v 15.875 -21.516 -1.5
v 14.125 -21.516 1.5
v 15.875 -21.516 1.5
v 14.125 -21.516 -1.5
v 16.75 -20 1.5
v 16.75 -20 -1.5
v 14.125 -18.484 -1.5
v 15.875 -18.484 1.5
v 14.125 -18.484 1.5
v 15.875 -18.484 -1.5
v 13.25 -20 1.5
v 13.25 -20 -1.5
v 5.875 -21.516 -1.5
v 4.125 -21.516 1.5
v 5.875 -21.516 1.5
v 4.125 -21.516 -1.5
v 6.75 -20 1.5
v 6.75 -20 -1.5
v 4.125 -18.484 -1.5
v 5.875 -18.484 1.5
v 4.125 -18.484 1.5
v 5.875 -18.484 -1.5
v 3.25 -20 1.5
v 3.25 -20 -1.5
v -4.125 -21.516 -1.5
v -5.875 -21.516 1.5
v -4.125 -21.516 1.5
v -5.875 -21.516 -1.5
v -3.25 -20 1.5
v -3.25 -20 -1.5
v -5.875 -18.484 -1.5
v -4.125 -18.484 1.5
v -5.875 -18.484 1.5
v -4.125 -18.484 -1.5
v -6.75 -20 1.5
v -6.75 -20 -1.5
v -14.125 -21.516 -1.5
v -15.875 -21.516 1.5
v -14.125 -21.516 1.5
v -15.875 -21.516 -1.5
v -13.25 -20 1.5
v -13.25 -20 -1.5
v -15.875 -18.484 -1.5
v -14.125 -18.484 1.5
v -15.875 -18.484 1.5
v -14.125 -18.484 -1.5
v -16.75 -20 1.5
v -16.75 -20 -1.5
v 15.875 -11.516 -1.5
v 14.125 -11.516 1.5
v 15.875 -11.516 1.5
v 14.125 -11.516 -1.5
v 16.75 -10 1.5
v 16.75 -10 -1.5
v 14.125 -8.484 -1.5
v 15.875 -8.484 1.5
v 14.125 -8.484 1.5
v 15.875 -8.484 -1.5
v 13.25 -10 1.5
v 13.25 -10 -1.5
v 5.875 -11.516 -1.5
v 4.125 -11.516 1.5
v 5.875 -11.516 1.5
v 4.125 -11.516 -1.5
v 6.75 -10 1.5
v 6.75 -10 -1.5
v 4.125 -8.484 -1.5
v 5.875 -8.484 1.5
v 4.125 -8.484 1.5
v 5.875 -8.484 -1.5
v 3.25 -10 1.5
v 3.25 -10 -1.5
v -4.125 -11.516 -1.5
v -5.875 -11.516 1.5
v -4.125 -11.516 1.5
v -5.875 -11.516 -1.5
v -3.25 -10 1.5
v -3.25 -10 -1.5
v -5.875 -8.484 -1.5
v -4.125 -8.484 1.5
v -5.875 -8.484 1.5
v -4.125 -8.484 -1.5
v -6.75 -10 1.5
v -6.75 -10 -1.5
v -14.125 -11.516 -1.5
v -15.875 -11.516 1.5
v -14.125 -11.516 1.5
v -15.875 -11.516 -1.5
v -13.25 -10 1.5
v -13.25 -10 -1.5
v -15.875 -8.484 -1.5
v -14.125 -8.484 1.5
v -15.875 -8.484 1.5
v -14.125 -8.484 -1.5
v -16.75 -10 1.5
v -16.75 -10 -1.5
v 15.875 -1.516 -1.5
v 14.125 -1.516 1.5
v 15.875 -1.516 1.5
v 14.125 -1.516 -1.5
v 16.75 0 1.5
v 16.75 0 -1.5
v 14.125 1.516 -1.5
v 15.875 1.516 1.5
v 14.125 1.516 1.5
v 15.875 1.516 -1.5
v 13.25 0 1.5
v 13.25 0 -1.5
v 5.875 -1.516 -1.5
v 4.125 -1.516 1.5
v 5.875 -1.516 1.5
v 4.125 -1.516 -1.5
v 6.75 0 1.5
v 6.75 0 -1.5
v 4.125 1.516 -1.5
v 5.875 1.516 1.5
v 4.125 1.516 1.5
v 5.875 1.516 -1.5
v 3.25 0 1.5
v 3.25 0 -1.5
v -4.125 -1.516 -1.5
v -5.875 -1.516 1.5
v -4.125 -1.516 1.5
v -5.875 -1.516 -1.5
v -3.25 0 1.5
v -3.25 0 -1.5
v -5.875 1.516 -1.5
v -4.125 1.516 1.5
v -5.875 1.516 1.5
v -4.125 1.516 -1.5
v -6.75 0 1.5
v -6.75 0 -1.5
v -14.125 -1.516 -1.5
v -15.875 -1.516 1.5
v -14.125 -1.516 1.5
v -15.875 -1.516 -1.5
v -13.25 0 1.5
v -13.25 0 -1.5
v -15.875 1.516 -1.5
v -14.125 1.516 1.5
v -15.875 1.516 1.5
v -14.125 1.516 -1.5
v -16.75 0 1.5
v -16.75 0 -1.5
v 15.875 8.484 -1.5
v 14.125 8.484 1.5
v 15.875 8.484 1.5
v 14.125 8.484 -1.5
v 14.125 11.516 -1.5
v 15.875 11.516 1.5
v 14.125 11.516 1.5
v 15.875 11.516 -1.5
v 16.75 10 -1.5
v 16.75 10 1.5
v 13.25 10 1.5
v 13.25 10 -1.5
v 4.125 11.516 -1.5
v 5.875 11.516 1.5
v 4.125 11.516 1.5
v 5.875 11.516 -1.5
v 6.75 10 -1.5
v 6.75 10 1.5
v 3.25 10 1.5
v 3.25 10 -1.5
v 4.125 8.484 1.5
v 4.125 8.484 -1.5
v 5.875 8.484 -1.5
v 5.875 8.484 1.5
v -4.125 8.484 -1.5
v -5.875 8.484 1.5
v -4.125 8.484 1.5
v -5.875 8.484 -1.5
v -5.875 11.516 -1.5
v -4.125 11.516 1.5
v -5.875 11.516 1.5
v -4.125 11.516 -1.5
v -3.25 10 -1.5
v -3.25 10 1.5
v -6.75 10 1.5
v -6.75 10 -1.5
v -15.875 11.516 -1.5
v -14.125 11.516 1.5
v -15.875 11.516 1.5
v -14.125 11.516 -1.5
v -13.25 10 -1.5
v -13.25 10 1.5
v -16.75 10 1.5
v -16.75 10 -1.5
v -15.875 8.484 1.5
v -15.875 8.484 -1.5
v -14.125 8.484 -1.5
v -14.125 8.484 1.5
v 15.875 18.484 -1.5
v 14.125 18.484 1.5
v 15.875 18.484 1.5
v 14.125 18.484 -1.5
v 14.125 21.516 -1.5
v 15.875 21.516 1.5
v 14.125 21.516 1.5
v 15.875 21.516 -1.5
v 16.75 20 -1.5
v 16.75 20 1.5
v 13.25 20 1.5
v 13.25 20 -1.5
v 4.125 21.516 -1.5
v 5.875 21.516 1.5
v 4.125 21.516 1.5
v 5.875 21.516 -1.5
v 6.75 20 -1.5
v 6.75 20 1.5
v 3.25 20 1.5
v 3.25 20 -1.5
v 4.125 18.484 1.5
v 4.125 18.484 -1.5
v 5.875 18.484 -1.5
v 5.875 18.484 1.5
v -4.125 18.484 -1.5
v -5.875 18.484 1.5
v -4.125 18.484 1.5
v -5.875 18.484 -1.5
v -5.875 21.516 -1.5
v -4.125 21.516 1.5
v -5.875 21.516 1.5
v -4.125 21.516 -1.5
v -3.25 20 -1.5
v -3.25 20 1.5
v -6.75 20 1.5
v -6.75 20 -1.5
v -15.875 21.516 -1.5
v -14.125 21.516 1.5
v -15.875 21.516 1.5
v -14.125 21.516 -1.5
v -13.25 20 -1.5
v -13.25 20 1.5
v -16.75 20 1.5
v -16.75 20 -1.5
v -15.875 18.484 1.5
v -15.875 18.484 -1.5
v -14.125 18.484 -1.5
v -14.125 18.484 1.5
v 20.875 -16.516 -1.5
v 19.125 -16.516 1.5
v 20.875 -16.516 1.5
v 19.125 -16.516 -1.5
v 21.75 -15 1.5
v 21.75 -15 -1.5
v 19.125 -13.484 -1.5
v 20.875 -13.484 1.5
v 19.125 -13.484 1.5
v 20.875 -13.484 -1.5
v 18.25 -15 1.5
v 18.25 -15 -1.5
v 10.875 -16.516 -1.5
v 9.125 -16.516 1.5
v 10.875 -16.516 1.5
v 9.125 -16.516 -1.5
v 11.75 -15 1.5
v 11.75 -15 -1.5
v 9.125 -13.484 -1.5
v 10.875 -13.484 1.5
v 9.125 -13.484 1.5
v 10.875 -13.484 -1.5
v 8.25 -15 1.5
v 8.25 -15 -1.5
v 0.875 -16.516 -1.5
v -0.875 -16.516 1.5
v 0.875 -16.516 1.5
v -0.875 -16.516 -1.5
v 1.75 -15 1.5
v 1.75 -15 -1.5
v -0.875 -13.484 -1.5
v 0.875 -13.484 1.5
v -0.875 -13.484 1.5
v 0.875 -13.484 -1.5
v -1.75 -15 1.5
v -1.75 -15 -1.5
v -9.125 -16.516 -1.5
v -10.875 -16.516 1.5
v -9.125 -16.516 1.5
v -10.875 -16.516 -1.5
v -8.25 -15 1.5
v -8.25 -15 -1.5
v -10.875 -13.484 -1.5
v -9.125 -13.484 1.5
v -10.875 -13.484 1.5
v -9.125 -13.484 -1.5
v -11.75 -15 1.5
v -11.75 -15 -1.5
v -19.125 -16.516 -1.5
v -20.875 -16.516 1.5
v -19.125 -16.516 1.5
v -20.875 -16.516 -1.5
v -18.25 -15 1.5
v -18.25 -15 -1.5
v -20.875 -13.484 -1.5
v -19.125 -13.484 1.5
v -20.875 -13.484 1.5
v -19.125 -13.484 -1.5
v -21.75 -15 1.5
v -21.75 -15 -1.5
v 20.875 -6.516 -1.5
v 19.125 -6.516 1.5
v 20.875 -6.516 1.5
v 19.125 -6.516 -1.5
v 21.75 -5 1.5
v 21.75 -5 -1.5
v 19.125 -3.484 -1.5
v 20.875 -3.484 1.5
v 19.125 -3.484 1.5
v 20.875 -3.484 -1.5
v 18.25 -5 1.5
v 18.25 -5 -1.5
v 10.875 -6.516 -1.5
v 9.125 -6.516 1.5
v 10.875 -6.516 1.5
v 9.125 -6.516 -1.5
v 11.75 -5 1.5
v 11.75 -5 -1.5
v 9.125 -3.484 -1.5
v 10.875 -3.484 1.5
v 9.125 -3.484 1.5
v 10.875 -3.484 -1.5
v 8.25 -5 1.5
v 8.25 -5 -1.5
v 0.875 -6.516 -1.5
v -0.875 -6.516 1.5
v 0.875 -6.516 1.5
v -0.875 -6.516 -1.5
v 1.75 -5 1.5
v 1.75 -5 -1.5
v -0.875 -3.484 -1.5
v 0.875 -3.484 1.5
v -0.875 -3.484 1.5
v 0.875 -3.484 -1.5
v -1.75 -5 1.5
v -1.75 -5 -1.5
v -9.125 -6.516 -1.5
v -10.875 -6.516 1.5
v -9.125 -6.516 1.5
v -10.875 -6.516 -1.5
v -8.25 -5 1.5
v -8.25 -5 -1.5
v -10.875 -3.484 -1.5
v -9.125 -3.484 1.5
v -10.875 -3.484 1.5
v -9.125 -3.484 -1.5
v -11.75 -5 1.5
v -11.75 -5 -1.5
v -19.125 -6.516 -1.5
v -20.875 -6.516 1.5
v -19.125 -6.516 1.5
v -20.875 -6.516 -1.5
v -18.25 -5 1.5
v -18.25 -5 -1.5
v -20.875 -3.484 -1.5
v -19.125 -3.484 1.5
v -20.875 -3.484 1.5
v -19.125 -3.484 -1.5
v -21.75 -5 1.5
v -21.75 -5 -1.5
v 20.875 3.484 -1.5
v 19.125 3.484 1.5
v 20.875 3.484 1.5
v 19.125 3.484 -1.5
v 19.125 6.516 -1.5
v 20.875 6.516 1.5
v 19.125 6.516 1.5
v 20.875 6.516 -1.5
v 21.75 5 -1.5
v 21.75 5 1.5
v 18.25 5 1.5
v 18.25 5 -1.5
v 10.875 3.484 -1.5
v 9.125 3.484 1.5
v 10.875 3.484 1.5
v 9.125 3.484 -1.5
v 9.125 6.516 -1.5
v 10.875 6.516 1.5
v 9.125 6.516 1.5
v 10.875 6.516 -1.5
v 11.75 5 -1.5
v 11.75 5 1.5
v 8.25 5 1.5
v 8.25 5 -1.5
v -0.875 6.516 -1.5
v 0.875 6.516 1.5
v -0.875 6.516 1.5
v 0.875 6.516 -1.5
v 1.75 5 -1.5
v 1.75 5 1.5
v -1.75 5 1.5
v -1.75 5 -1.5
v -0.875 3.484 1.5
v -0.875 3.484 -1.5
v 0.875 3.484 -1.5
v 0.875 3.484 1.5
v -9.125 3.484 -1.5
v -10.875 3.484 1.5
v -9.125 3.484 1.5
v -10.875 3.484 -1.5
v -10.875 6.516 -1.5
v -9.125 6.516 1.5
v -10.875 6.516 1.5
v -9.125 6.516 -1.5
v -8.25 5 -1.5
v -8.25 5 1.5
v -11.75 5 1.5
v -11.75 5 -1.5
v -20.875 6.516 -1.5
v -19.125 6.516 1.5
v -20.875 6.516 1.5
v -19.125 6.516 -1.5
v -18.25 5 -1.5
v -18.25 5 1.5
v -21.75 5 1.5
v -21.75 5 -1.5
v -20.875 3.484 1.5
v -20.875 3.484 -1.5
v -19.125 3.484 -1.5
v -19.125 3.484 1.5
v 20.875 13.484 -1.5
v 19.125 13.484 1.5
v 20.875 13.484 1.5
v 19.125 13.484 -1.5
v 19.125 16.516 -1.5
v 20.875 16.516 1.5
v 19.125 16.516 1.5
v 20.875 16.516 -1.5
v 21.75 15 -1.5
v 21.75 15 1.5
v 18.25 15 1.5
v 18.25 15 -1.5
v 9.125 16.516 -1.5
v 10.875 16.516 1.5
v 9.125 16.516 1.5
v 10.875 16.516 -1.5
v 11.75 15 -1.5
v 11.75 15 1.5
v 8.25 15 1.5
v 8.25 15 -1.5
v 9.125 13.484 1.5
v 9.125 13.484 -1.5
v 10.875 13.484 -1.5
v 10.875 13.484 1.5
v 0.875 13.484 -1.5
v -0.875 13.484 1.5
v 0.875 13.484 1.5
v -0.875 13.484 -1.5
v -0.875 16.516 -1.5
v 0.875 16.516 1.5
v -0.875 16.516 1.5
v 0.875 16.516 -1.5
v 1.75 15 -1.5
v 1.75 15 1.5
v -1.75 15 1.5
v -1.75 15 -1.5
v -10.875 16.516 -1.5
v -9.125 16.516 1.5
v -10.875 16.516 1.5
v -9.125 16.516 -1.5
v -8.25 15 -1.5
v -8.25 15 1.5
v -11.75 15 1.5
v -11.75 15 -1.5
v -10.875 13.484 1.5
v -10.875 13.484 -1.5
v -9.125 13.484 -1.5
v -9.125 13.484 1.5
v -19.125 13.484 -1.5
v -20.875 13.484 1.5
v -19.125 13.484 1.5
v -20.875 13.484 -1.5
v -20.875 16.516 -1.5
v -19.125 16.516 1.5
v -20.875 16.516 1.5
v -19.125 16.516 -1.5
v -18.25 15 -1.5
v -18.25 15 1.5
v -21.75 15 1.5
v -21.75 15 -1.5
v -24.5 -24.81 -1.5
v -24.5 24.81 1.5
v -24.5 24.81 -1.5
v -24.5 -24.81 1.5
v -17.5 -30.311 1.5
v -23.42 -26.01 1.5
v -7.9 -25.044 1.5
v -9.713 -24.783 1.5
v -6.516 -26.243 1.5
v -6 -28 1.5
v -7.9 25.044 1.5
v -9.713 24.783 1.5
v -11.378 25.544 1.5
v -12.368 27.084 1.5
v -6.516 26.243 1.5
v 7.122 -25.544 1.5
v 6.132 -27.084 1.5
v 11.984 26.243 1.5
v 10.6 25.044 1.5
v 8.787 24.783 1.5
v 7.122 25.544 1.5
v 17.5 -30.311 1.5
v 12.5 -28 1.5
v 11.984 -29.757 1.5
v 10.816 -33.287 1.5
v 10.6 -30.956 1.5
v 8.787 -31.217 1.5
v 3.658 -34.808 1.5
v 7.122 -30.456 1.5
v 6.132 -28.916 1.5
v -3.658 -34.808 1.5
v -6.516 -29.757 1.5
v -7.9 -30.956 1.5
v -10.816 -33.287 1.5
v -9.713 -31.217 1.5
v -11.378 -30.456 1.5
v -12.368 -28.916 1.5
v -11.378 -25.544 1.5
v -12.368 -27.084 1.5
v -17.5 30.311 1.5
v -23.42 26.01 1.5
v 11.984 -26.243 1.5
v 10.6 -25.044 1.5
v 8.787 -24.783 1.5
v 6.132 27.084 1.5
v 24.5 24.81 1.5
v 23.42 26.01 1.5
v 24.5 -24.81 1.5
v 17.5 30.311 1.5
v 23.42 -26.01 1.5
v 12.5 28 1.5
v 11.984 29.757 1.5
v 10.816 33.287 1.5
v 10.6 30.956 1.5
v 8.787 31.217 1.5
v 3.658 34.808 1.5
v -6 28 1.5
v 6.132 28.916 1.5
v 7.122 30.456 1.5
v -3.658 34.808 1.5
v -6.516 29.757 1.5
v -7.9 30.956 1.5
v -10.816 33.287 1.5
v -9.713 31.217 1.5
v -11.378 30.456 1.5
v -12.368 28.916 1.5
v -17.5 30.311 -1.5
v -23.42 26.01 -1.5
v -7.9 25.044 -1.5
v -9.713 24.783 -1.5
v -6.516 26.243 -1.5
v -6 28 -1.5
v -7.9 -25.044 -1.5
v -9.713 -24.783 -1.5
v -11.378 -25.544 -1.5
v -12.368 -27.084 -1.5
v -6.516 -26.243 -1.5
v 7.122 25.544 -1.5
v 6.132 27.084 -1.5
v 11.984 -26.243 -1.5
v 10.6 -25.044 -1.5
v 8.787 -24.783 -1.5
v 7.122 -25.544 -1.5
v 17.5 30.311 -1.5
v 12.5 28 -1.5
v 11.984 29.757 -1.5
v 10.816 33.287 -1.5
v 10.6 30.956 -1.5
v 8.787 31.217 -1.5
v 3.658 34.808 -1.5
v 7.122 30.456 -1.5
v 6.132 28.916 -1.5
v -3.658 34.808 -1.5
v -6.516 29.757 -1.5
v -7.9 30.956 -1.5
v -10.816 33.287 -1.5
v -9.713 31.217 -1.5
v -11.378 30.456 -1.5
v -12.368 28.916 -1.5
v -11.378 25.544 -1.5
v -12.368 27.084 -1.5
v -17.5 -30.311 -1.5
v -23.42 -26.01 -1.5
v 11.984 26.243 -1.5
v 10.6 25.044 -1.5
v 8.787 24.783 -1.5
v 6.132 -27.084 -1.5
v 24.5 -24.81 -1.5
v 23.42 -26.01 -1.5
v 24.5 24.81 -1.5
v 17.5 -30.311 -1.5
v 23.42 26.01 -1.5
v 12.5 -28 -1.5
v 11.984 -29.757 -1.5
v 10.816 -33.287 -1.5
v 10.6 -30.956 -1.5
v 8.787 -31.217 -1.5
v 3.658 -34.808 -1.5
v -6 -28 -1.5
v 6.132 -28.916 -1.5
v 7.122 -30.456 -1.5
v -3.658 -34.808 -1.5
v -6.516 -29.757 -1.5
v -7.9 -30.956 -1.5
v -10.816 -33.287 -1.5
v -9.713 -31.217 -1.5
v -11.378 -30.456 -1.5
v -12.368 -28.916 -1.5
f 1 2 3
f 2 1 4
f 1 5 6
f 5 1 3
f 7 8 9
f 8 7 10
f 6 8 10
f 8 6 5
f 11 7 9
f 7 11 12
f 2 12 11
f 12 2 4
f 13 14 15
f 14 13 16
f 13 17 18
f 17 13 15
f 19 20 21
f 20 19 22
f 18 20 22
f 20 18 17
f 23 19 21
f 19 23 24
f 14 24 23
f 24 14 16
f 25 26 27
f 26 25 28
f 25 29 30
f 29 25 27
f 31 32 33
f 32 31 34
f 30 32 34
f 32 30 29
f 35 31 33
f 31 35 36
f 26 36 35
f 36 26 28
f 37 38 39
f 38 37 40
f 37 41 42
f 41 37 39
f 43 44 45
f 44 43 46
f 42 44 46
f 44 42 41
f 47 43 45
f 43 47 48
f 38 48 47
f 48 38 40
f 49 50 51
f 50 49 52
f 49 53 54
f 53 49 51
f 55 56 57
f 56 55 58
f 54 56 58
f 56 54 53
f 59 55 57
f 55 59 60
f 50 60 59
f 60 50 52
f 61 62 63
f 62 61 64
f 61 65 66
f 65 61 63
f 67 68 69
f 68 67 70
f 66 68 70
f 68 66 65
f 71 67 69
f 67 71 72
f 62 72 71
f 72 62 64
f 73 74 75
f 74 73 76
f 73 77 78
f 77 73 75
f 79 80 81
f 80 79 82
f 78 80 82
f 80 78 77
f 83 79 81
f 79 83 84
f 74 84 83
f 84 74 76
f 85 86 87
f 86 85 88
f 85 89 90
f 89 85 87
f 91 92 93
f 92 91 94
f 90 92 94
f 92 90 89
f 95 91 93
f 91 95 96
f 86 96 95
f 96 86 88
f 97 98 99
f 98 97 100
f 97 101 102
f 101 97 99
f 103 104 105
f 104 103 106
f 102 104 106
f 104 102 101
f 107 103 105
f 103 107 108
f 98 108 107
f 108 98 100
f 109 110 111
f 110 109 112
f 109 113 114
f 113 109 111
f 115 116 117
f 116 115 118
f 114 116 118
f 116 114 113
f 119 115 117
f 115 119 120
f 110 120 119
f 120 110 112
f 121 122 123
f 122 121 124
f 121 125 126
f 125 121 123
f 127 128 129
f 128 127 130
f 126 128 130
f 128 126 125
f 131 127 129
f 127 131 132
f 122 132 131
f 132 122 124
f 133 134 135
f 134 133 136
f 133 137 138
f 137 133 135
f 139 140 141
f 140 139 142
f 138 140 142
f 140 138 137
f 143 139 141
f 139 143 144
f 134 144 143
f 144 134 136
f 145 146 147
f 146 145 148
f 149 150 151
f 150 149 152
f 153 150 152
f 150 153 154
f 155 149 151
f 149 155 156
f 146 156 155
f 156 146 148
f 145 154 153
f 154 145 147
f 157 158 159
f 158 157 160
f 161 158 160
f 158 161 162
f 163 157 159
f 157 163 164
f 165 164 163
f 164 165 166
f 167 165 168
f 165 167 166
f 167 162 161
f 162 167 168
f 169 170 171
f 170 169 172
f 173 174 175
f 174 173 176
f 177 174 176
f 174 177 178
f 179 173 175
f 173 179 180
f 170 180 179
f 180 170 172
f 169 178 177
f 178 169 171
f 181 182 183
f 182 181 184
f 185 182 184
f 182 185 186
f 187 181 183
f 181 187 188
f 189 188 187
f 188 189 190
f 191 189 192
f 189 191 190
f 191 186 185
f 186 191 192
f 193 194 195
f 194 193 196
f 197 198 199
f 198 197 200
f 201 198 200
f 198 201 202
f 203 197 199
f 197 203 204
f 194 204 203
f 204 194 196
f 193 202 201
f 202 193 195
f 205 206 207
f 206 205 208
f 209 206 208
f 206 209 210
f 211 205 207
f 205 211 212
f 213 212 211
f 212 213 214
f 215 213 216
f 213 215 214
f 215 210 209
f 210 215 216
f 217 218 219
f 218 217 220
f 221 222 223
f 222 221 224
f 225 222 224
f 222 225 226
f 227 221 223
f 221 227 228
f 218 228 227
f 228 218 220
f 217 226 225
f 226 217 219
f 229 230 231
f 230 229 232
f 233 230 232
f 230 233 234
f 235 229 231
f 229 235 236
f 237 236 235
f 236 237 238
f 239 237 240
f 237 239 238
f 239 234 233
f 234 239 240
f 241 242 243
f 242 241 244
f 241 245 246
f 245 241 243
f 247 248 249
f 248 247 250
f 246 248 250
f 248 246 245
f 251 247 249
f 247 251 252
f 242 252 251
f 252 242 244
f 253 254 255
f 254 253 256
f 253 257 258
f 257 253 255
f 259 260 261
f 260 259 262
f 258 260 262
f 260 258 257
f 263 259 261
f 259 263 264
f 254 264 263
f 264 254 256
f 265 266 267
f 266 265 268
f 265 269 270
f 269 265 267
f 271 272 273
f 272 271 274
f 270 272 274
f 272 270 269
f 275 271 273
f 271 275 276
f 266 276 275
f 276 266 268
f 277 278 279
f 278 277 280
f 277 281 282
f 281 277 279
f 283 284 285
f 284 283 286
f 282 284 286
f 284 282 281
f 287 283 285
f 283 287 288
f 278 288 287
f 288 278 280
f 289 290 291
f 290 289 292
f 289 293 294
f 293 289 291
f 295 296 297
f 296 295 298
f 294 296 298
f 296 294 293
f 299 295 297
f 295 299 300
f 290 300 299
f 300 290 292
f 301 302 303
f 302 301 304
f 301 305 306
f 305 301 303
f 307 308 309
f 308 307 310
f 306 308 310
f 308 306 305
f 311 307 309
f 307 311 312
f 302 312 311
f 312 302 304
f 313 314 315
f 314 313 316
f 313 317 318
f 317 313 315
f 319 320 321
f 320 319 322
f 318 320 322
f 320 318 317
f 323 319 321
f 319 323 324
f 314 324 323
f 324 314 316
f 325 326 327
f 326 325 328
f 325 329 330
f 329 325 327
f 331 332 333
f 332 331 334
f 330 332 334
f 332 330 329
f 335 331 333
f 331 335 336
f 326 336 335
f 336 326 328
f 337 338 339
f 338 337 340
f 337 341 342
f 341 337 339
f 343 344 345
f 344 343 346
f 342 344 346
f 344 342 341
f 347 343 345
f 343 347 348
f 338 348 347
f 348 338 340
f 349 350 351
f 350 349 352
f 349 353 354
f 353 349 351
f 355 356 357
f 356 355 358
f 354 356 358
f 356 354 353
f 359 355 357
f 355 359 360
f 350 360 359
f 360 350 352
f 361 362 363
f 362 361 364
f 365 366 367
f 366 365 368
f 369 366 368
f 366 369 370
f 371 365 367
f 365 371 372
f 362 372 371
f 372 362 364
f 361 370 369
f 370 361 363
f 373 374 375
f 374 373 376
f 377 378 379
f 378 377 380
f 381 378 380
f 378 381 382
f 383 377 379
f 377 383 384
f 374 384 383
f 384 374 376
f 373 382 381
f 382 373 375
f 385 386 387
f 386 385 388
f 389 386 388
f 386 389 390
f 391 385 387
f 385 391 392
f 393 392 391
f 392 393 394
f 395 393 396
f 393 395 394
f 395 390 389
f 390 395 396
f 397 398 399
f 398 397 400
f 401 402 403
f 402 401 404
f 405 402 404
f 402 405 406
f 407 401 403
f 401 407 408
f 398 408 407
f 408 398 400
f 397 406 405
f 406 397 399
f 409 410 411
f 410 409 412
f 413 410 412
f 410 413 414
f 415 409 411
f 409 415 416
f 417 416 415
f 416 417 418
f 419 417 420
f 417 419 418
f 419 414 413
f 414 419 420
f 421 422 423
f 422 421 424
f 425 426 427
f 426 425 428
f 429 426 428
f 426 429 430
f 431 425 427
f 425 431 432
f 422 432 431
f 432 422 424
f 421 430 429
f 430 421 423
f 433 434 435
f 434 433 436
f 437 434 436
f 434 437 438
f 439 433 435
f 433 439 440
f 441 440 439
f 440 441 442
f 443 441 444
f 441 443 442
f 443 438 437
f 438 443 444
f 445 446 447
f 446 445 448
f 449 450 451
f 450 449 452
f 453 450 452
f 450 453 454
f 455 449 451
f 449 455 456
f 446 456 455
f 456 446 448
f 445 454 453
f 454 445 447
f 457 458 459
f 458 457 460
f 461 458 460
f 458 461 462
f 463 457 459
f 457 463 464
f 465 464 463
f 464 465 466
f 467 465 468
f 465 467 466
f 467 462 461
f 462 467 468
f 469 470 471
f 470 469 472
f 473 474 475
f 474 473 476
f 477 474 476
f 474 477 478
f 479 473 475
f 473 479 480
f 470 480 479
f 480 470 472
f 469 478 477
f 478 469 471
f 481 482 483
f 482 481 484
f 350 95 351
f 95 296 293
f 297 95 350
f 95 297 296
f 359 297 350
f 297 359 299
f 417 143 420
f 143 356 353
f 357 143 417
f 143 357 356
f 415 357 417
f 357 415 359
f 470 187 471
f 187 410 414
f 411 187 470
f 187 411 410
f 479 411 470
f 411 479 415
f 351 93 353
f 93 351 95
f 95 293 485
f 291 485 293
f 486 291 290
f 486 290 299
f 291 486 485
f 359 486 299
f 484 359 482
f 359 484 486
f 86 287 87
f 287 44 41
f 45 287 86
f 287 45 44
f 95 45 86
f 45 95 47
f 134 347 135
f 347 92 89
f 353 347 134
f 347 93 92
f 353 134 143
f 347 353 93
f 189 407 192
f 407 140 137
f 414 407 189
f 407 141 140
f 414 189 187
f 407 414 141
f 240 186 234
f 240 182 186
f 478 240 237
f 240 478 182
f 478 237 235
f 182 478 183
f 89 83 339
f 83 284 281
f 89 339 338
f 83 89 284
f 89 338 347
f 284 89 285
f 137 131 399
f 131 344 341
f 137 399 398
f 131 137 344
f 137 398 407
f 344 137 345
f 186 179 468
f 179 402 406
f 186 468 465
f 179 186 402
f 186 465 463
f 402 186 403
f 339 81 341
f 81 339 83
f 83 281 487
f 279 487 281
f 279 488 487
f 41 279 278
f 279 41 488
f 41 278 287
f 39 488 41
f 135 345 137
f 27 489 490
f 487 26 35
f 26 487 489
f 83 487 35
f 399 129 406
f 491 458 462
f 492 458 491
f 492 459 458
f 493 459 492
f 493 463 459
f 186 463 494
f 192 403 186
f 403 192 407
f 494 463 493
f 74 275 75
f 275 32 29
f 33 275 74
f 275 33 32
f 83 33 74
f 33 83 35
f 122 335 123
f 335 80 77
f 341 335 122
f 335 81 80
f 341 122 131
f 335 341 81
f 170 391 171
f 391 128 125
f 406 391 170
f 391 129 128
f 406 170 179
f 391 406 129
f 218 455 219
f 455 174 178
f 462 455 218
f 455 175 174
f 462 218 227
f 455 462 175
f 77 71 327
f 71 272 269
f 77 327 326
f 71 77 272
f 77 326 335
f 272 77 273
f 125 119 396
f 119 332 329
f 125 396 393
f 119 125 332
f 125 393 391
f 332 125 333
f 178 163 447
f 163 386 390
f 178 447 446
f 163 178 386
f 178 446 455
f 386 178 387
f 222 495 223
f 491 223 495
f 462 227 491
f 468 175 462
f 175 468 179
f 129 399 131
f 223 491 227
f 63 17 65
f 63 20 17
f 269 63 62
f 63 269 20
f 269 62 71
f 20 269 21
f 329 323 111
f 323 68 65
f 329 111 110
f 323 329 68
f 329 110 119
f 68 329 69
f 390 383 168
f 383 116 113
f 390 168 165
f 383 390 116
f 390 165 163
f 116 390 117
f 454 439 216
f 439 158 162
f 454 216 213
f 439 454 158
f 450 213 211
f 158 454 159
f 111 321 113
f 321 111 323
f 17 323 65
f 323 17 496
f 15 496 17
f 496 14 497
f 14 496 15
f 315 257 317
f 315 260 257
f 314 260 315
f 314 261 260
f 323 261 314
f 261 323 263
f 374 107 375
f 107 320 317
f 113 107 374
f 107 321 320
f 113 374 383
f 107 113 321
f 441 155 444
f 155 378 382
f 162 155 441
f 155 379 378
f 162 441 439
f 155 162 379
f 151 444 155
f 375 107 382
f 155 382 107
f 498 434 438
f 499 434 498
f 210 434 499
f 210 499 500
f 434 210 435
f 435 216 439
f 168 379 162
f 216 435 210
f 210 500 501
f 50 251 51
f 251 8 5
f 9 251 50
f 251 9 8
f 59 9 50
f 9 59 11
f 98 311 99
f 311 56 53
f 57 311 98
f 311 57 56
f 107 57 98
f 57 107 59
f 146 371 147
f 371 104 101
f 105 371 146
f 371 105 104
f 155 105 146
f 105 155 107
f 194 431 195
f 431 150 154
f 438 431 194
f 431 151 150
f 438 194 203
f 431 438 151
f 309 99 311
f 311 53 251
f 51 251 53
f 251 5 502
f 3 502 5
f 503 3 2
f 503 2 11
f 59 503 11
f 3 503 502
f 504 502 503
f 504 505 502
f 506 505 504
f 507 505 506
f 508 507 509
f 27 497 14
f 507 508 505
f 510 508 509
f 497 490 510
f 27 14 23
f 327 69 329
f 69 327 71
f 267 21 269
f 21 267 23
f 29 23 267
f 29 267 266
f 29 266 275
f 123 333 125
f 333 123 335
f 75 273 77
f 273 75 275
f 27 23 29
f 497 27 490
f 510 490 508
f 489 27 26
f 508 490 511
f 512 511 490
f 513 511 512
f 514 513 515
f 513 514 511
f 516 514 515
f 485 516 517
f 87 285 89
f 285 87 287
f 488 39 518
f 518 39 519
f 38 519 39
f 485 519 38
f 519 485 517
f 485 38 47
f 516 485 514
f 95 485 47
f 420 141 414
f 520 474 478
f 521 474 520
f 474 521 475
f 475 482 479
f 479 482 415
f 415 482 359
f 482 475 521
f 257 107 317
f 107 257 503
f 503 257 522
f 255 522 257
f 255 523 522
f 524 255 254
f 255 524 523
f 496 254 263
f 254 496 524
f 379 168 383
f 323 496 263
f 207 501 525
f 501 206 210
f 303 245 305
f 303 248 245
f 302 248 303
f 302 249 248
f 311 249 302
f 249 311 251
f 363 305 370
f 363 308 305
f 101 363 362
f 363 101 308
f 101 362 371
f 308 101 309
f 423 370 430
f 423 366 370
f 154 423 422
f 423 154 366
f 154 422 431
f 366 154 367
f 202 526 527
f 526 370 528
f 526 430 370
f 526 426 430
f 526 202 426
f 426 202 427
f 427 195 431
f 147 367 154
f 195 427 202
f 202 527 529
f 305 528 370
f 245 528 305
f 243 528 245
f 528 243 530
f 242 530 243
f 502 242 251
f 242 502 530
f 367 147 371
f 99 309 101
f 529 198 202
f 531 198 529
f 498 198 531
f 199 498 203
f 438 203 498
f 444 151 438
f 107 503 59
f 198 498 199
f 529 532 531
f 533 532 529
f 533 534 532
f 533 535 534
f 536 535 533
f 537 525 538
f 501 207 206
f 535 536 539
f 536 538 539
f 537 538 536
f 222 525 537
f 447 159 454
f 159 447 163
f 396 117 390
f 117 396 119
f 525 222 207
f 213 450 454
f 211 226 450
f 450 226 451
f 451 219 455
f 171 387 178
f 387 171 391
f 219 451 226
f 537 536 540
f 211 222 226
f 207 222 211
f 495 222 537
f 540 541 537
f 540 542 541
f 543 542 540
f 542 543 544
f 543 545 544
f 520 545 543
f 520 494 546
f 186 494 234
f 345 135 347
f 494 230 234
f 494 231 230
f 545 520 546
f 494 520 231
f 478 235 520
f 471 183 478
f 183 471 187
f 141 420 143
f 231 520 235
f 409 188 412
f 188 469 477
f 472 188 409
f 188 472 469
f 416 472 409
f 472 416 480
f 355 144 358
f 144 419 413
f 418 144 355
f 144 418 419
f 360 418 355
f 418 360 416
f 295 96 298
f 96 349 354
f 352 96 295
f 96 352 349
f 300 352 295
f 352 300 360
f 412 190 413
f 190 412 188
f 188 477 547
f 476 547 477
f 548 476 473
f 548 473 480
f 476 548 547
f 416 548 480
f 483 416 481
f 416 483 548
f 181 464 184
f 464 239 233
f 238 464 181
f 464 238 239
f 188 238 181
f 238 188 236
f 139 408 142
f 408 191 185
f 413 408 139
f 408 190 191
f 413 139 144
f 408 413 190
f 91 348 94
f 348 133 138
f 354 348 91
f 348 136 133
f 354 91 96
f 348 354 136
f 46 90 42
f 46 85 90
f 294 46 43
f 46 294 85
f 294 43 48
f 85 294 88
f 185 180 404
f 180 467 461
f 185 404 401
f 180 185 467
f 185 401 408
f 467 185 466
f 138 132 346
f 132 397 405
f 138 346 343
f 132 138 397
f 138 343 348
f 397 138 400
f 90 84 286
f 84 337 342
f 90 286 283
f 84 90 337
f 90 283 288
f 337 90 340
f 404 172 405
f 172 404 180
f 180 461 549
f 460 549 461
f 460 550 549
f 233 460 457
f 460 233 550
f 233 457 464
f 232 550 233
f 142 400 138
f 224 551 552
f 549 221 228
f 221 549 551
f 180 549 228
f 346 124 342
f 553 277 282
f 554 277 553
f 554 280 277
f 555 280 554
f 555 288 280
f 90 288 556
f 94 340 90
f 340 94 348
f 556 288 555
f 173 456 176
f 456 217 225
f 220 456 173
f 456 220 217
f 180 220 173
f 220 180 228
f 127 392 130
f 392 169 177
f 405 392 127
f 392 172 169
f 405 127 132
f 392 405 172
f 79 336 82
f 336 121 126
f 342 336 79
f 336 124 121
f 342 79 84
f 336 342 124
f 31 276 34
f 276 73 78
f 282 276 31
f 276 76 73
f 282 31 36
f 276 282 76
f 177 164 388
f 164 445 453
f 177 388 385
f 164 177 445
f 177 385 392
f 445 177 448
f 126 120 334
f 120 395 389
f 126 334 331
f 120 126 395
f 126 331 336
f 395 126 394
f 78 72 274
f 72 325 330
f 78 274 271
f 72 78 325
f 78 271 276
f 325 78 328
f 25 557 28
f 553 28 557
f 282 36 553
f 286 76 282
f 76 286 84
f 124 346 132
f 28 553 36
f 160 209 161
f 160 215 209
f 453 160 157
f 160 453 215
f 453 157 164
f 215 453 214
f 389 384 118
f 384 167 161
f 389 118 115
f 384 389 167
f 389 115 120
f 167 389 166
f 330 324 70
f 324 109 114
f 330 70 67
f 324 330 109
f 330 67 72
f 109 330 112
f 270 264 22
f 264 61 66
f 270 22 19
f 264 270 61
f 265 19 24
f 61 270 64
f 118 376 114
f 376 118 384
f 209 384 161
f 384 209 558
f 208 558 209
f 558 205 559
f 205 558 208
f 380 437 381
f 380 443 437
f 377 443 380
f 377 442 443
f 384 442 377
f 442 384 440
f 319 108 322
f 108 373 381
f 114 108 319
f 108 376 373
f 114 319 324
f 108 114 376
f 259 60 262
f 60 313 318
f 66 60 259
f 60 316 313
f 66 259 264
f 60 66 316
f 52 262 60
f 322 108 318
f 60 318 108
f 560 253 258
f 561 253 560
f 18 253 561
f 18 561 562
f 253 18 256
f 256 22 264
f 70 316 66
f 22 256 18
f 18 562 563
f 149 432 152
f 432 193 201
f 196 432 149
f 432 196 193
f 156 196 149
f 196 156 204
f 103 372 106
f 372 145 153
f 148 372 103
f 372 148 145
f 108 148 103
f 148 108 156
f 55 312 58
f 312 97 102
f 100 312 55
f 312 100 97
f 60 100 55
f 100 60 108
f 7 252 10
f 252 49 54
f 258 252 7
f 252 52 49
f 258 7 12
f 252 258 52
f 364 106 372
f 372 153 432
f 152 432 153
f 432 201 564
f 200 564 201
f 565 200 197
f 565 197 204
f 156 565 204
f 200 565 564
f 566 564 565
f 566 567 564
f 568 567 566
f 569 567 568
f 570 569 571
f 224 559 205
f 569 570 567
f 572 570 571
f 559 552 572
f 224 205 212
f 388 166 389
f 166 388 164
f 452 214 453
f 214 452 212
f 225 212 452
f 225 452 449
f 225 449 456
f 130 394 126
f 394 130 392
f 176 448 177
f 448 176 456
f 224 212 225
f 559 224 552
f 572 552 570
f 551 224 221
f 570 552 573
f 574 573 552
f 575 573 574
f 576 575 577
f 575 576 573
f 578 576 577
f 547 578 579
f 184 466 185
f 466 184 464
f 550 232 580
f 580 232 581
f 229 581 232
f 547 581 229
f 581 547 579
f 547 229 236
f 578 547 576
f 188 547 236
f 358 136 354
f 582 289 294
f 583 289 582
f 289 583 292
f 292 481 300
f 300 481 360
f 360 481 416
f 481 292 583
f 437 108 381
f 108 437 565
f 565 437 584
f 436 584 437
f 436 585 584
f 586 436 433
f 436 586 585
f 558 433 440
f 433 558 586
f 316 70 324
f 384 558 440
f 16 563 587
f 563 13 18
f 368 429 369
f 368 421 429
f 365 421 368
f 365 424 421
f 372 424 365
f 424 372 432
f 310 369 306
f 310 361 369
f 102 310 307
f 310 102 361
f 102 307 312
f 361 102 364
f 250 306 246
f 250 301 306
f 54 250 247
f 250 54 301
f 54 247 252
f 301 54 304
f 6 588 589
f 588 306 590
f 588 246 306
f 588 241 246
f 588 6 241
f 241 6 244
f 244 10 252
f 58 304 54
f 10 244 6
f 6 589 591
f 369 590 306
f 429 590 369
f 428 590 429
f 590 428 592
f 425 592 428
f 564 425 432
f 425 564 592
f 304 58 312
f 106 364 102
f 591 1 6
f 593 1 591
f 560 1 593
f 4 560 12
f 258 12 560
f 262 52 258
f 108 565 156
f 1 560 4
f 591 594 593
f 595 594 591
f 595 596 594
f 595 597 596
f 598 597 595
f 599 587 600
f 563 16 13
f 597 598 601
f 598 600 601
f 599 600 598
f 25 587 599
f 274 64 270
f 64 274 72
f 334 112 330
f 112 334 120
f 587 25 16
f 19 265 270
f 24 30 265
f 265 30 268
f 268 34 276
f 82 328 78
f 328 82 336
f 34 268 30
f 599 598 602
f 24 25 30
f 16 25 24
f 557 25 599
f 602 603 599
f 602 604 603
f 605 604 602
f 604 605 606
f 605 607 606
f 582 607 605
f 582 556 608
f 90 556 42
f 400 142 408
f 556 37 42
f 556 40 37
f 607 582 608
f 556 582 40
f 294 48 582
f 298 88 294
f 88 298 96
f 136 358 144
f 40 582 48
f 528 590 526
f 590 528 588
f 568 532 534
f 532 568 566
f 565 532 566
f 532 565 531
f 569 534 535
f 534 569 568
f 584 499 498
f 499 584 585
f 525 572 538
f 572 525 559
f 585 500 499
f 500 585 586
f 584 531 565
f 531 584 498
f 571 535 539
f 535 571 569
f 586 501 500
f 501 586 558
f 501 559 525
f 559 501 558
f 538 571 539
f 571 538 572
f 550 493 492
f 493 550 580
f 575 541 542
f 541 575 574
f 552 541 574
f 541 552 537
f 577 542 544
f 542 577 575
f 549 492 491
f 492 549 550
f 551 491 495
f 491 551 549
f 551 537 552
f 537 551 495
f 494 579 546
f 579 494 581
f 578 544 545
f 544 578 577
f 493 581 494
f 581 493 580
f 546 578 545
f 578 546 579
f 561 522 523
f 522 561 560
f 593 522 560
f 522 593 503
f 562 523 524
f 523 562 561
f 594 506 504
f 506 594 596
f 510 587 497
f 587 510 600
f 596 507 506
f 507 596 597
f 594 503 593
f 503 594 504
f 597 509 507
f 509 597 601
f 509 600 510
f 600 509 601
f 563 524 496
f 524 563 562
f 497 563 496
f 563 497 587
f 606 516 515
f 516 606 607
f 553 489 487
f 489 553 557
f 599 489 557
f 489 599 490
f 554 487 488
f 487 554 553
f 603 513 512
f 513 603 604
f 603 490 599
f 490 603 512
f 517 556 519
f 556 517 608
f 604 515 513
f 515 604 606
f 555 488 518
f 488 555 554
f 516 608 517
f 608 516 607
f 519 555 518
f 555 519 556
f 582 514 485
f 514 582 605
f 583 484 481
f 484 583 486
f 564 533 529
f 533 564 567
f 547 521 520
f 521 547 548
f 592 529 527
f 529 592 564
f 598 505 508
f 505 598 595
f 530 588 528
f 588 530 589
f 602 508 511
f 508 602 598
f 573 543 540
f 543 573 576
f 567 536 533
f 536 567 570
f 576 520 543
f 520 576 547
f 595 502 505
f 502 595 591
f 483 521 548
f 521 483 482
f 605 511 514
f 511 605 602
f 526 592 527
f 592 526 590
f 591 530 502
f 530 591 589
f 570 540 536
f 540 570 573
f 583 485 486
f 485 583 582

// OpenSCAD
// file: settings.scad
baseWidth = 70;
baseRadius = baseWidth / 2;
baseHeight = 3;
wheelCutDepth = 10;
wheelCutSize = 50;
motorWidth = 12;
motorHeight = 10;
motorLength = 23;
motorScrewSize = 4;

//rail
railDiameter=5.5;
railWidth=24;
railPos=28;

screwSize=4;
railSize=5;
screwSpace=2;
mountHeight=3;
railBlockLength=railSize+2*screwSpace;
screwAreaLength=screwSize+2*screwSpace;
topLength=2*railBlockLength+screwAreaLength;
mountItemSize=screwAreaLength;

servoWidth=25;
servoDepth=13;
servoOffset=6;
// main file
include <settings.scad>;

batteryMount();

camWidth=25;
camHeight=25;
hingeWidth=35;
hingeDepth=10;
hingeHeight=15;
hingeBase=5;

module batteryMount(){
    difference(){
        cylinder(d=baseWidth,h=baseHeight, center=true);
//        
        union(){
            translate([-1*(baseRadius-wheelCutDepth+wheelCutDepth/2),0,0])
                cube([wheelCutDepth+1, wheelCutSize, baseHeight],center=true);
            translate([(baseRadius-wheelCutDepth+wheelCutDepth/2),0,0])
                cube([wheelCutDepth+1, wheelCutSize, baseHeight],center=true);
            
            translate([railWidth/2-railDiameter/2,railPos,0])
                cylinder(d=railDiameter+1,h=100, center=true);
            translate([-1*(railWidth/2-railDiameter/2),railPos,0])
                cylinder(d=railDiameter+1,h=100, center=true);
            
            translate([railWidth/2-railDiameter/2,-railPos,0])
                cylinder(d=railDiameter+1,h=100, center=true);
            translate([-(railWidth/2-railDiameter/2),-railPos,0])
                cylinder(d=railDiameter+1,h=100, center=true);
            
            for (i = [-20, -10, 0, 10, 20]){
                translate([15,i,0])
                    cylinder(d=3.5,h=100, center=true);
                translate([5,i,0])
                    cylinder(d=3.5,h=100, center=true);
                translate([-5,i,0])
                    cylinder(d=3.5,h=100, center=true);
                translate([-15,i,0])
                    cylinder(d=3.5,h=100, center=true);
            
            }
            
            
            for (i = [-15, -5, 5, 15]){
                translate([20,i,0])
                    cylinder(d=3.5,h=100, center=true);
                translate([10,i,0])
                    cylinder(d=3.5,h=100, center=true);
                translate([0,i,0])
                    cylinder(d=3.5,h=100, center=true);
                translate([-10,i,0])
                    cylinder(d=3.5,h=100, center=true);
                translate([-20,i,0])
                    cylinder(d=3.5,h=100, center=true);
            
            }
        }
    }
}


module sonarMount(){
    *difference(){
        cube([20,20,5], center=true);
        union(){
            translate([-5,-5,0])
                cylinder(d=5.5, h=5, center=true);
            
            translate([-5,5,0])
                cylinder(d=3.5, h=5, center=true);
            
            translate([5,-5,0])
                cylinder(d=3.5, h=5, center=true);
            
            translate([0,0,-2.5])
                cube([10,10,5]);
        }
    }
    
    translate([18,0,0])
        difference(){
            cube([12,20,5], center=true);
            union(){
                translate([-1.5,-5,-10])
                    cylinder(d=5.5, h=20);
                
                rotate([0,90,0])
                    translate([-0,3,-15])
                        cylinder(d=2.5, h=30);
                
                translate([3,-10,-3])
                    cube([3,10,10]);
            }
        
        }
        
     translate([34,0,0])
        difference(){
            cube([16,10,5], center=true);
            union(){
                translate([-3,0,-10])
                    cylinder(d=5.5, h=20);
                
                
            }
        
        }
        
}

module camServoMount(){
    difference(){
        cube([6,14,14], center=true);
        union(){
            translate([0,-2,0])
                cylinder(d=3.5, h=20, center=true);
            
            translate([1,0,3])
                rotate([90,0,0])
                    cylinder(d=2.5, h=20, center=true);
            
        }
    }
    translate([10,0,0])
    difference(){
        cube([6,14,14], center=true);
        union(){
            translate([0,-2,0])
                cylinder(d=3.5, h=20, center=true);
            
            translate([-1,0,3])
                rotate([90,0,0])
                    cylinder(d=2.5, h=20, center=true);
            
        }
    }

}

module camHinge(){
    
    translate([0,0,-8])
    rotate([180,0,0])
    difference(){
        cube([hingeWidth,hingeDepth,hingeHeight],center=true);
        union(){
            translate([0,0,hingeBase])
                cube([camWidth+2,hingeDepth,hingeHeight],center=true);
            
            translate([-5,0,0])
                cylinder(d=3.5, h=100,center=true);
            
            translate([5,0,0])
                cylinder(d=3.5, h=100,center=true);
            
            translate([0,0,(hingeHeight-hingeBase)/3])
                rotate([0,90,0])
                    cylinder(d=4, h=100,center=true);
        }
    }
    
    *rotate([0,90,0])
        translate([0,10,0])
            difference(){
                cube([5,hingeDepth,camHeight+3]);
                union(){
                    translate([0,-5,7])
                        cube([camWidth+4,hingeDepth,camHeight]);
                    
                    translate([0,hingeDepth/2,(hingeHeight-hingeBase)/3])
                        rotate([0,90,0])
                            cylinder(d=3.5, h=100,center=true);
                    
                    translate([2.5,0,7+2])
                        rotate([90,0,0])
                            cylinder(d=2, h=100,center=true);
                    
                    translate([2.5,0,7+2+13])
                        rotate([90,0,0])
                            cylinder(d=2.5, h=100,center=true);
                    
                    translate([2.5,7.5,7+2+13+3])
                        rotate([0,90,0])
                            cylinder(d=2.5, h=100,center=true);
                }
            }
    
        
    *rotate([0,90,0])
        translate([0,25,0])
            difference(){
                cube([5,hingeDepth,camHeight+3]);
                union(){
                    translate([0,-5,7])
                        cube([camWidth+4,hingeDepth,camHeight]);
                    
                    translate([0,hingeDepth/2,(hingeHeight-hingeBase)/3])
                        rotate([0,90,0])
                            cylinder(d=3.5, h=100,center=true);
                    
                    translate([2.5,0,7+2])
                        rotate([90,0,0])
                            cylinder(d=2.5, h=100,center=true);
                    
                    translate([2.5,0,7+2+13])
                        rotate([90,0,0])
                            cylinder(d=2.5, h=100,center=true);
                }
            }
    
}

module camTop(){
    difference(){
        union(){
            cylinder(d=baseWidth,h=baseHeight, center=true);
            translate([0,0,2])
                cylinder(d=18,h=baseHeight, center=true);
        }
        union(){
            
            translate([0,37,0])
                cube([25, 10, baseHeight],center=true);
            
            
            cylinder(d=8,h=100, center=true);
            
            translate([13/2,1.5,0])
                cylinder(d=1.5,h=100, center=true);
            translate([13/2,-1.5,0])
                cylinder(d=1.5,h=100, center=true);
            
            translate([-13/2,1.5,0])
                cylinder(d=1.5,h=100, center=true);
            translate([-13/2,-1.5,0])
                cylinder(d=1.5,h=100, center=true);
            
            
            translate([15,10,0])
                cylinder(d=3.5,h=100, center=true);
            translate([5,10,0])
                cylinder(d=3.5,h=100, center=true);
            translate([-5,10,0])
                cylinder(d=3.5,h=100, center=true);
            translate([-15,10,0])
                cylinder(d=3.5,h=100, center=true);
                
            translate([15,15,0])
                cylinder(d=3.5,h=100, center=true);
            translate([5,15,0])
                cylinder(d=3.5,h=100, center=true);
            translate([-5,15,0])
                cylinder(d=3.5,h=100, center=true);
            translate([-15,15,0])
                cylinder(d=3.5,h=100, center=true);
            
            translate([15,20,0])
                cylinder(d=3.5,h=100, center=true);
            translate([5,20,0])
                cylinder(d=3.5,h=100, center=true);
            translate([-5,20,0])
                cylinder(d=3.5,h=100, center=true);
            translate([-15,20,0])
                cylinder(d=3.5,h=100, center=true);
                
            translate([15,-10,0])
                cylinder(d=3.5,h=100, center=true);
            translate([5,-10,0])
                cylinder(d=3.5,h=100, center=true);
            translate([-5,-10,0])
                cylinder(d=3.5,h=100, center=true);
            translate([-15,-10,0])
                cylinder(d=3.5,h=100, center=true);
                
            translate([15,-20,0])
                cylinder(d=3.5,h=100, center=true);
            translate([5,-20,0])
                cylinder(d=3.5,h=100, center=true);
            translate([-5,-20,0])
                cylinder(d=3.5,h=100, center=true);
            translate([-15,-20,0])
                cylinder(d=3.5,h=100, center=true);
            
            
            translate([15,-0,0])
                cylinder(d=3.5,h=100, center=true);
            translate([25,-0,0])
                cylinder(d=3.5,h=100, center=true);
            
            
            translate([-15,-0,0])
                cylinder(d=3.5,h=100, center=true);
            translate([-25,-0,0])
                cylinder(d=3.5,h=100, center=true);
            
        }
        
    }
    
}

module top(){
    difference (){
        
        cylinder(d=baseWidth,h=baseHeight, center=true);
        
        union(){
            translate([baseRadius-wheelCutDepth+wheelCutDepth/2,0,0])
                cube([wheelCutDepth, wheelCutSize, baseHeight],center=true);
            translate([-1*(baseRadius-wheelCutDepth+wheelCutDepth/2),0,0])
                cube([wheelCutDepth, wheelCutSize, baseHeight],center=true);
            
            translate([railWidth/2-railDiameter/2,railPos,0])
                cylinder(d=railDiameter+1,h=100, center=true);
            translate([-1*(railWidth/2-railDiameter/2),railPos,0])
                cylinder(d=railDiameter+1,h=100, center=true);
            
            translate([railWidth/2-railDiameter/2,-railPos,0])
                cylinder(d=railDiameter+1,h=100, center=true);
            translate([-(railWidth/2-railDiameter/2),-railPos,0])
                cylinder(d=railDiameter+1,h=100, center=true);
            
            translate([-servoOffset,0,0])
                cube([servoWidth, servoDepth,100], center=true);
            
            translate([servoOffset+2,0,0])
                cylinder(d=2,h=100, center=true);
            
            translate([servoOffset+6-32,0,0])
                cylinder(d=2,h=100, center=true);
            
        }
    }
}

module base(){
    difference (){
        
        cylinder(d=baseWidth,h=baseHeight, center=true);
        
        union(){
            translate([baseRadius-wheelCutDepth+wheelCutDepth/2-1,0,0])
                cube([wheelCutDepth+1, wheelCutSize, baseHeight],center=true);
            translate([-1*(baseRadius-wheelCutDepth+wheelCutDepth/2-1),0,0])
                cube([wheelCutDepth+1, wheelCutSize, baseHeight],center=true);
            
            translate([railWidth/2-railDiameter/2,railPos,0])
                cylinder(d=railDiameter,h=100, center=true);
            translate([-1*(railWidth/2-railDiameter/2),railPos,0])
                cylinder(d=railDiameter,h=100, center=true);
            
            translate([railWidth/2-railDiameter/2,-railPos,0])
                cylinder(d=railDiameter,h=100, center=true);
            translate([-(railWidth/2-railDiameter/2),-railPos,0])
                cylinder(d=railDiameter,h=100, center=true);
            
            
            translate([baseRadius-wheelCutDepth-motorScrewSize/2-3,23/2,0])
                cylinder(d=motorScrewSize,h=100, center=true);
            translate([baseRadius-wheelCutDepth-motorScrewSize/2-3-13,23/2,0])
                cylinder(d=motorScrewSize,h=100, center=true);
            
            
            translate([baseRadius-wheelCutDepth-motorScrewSize/2-3,-23/2,0])
                cylinder(d=motorScrewSize,h=100, center=true);
            translate([baseRadius-wheelCutDepth-motorScrewSize/2-3-13,-23/2,0])
                cylinder(d=motorScrewSize,h=100, center=true);
            
            translate([-(baseRadius-wheelCutDepth-motorScrewSize/2-3),23/2,0])
                cylinder(d=motorScrewSize,h=100, center=true);
            translate([-(baseRadius-wheelCutDepth-motorScrewSize/2-3-13),23/2,0])
                cylinder(d=motorScrewSize,h=100, center=true);
            
            
            translate([-(baseRadius-wheelCutDepth-motorScrewSize/2-3),-23/2,0])
                cylinder(d=motorScrewSize,h=100, center=true);
            translate([-(baseRadius-wheelCutDepth-motorScrewSize/2-3-13),-23/2,0])
                cylinder(d=motorScrewSize,h=100, center=true);
            

        }
       
    }
}


module pcb_mount_top(d,l){
    difference(){
        cube([topLength,screwAreaLength,screwAreaLength]);
        union(){
            translate([railBlockLength+screwAreaLength/2,screwAreaLength/2,0])
                cylinder(d=screwSize,h=mountHeight*2);
            
            translate([railBlockLength,0,3])
                cube([screwAreaLength,screwAreaLength,screwAreaLength]);
            
            translate([0,0,5])
                cube([railBlockLength,screwAreaLength,screwAreaLength-1]);
            
            translate([railBlockLength+screwAreaLength,0,5])
                cube([railBlockLength,screwAreaLength,screwAreaLength-1]);
            
            translate([railSize/2+screwSpace,screwAreaLength,-0.5])
                rotate([90,0,0])
                cylinder(d=railSize+1,h=10);
            
            translate([topLength-railSize/2-screwSpace,screwAreaLength,-0.5])
                rotate([90,0,0])
                cylinder(d=railSize+1,h=10);
            
            cube([topLength,screwAreaLength,0.5]);
        }
    }
}

module pcb_mount(d,l,r,pl){
    
    bl=pl+d+2*l;
    mh=railSize/2+screwSpace;
    
    echo(bl);
    difference(){
        difference(){
            cube([bl,mh+5,screwAreaLength]);
            
            union(){
                           
                
                translate([d+l+r,mh,0])
                    cube([bl-2*(d+l+r),topLength,topLength]);
                
                
                *translate([topLength,mountHeight,0])
                    cube([bl-l-d-r-topLength,topLength,topLength]);
                
                translate([bl/2-screwAreaLength/2-railBlockLength/2,-0.5,0])
                    cylinder(d=railSize+1,h=20);
                
                translate([bl/2+screwAreaLength/2+railBlockLength/2,-0.5,0])
                    cylinder(d=railSize+1,h=20);
                
                *translate([0,mh,screwAreaLength-2])
                    cube([l+d+r,d+l+r+mountHeight,screwAreaLength]);
                
                *translate([bl-l-d-r,mh,screwAreaLength-2])
                    cube([topLength,mountHeight+d+l+r,2]);
                
                *translate([bl-l-d/2,mh+l+d/2,0])
                    rotate([0,0,0])
                        cylinder(d=d,h=40);
                        
                *translate([l+d/2,mh+l+d/2,0])
                    rotate([90,0,0])
                        cylinder(d=d,h=40);
                
                translate([bl/2,mh+1,screwAreaLength/2])
                    rotate([90,0,0])
                        cylinder(d=screwSize,h=mh+1);
                        
                translate([bl/2,mh+.01,screwAreaLength/2])
                    rotate([90,0,0])
                        cylinder(d=3+screwSize,h=mountHeight-1,$fn=6);  
                  
                *translate([r+d/2,mh+2.5,r+d/2])
                    difference(){
                        cube([screwAreaLength,mh+1,screwAreaLength+1],center=true);
                        translate([0,0,0])
                            rotate([90,0,0])
                                //cylinder(d=d+r,h=5,center=true);
                                cube([d+r,d+r,5],center=true);
                    }
                    
                *translate([bl-r-d/2,mh+2.5,r+d/2])
                    difference(){
                        cube([screwAreaLength,mh+1,screwAreaLength+1],center=true);
                        translate([0,0,0])
                            rotate([90,0,0])
                                //cylinder(d=d+r,h=5,center=true);
                                cube([d+r,d+r,5],center=true);
                    }
                
                
            }
        }
        union(){
           translate([l+d/2,4,l+d/2])
            rotate([90,0,0])
            cylinder(d=d,h=7+mh,center=true);
            
            translate([bl-l-d/2,4,l+d/2])
            rotate([90,0,0])
            cylinder(d=d,h=7+mh,center=true);
            
        }
    }
}
